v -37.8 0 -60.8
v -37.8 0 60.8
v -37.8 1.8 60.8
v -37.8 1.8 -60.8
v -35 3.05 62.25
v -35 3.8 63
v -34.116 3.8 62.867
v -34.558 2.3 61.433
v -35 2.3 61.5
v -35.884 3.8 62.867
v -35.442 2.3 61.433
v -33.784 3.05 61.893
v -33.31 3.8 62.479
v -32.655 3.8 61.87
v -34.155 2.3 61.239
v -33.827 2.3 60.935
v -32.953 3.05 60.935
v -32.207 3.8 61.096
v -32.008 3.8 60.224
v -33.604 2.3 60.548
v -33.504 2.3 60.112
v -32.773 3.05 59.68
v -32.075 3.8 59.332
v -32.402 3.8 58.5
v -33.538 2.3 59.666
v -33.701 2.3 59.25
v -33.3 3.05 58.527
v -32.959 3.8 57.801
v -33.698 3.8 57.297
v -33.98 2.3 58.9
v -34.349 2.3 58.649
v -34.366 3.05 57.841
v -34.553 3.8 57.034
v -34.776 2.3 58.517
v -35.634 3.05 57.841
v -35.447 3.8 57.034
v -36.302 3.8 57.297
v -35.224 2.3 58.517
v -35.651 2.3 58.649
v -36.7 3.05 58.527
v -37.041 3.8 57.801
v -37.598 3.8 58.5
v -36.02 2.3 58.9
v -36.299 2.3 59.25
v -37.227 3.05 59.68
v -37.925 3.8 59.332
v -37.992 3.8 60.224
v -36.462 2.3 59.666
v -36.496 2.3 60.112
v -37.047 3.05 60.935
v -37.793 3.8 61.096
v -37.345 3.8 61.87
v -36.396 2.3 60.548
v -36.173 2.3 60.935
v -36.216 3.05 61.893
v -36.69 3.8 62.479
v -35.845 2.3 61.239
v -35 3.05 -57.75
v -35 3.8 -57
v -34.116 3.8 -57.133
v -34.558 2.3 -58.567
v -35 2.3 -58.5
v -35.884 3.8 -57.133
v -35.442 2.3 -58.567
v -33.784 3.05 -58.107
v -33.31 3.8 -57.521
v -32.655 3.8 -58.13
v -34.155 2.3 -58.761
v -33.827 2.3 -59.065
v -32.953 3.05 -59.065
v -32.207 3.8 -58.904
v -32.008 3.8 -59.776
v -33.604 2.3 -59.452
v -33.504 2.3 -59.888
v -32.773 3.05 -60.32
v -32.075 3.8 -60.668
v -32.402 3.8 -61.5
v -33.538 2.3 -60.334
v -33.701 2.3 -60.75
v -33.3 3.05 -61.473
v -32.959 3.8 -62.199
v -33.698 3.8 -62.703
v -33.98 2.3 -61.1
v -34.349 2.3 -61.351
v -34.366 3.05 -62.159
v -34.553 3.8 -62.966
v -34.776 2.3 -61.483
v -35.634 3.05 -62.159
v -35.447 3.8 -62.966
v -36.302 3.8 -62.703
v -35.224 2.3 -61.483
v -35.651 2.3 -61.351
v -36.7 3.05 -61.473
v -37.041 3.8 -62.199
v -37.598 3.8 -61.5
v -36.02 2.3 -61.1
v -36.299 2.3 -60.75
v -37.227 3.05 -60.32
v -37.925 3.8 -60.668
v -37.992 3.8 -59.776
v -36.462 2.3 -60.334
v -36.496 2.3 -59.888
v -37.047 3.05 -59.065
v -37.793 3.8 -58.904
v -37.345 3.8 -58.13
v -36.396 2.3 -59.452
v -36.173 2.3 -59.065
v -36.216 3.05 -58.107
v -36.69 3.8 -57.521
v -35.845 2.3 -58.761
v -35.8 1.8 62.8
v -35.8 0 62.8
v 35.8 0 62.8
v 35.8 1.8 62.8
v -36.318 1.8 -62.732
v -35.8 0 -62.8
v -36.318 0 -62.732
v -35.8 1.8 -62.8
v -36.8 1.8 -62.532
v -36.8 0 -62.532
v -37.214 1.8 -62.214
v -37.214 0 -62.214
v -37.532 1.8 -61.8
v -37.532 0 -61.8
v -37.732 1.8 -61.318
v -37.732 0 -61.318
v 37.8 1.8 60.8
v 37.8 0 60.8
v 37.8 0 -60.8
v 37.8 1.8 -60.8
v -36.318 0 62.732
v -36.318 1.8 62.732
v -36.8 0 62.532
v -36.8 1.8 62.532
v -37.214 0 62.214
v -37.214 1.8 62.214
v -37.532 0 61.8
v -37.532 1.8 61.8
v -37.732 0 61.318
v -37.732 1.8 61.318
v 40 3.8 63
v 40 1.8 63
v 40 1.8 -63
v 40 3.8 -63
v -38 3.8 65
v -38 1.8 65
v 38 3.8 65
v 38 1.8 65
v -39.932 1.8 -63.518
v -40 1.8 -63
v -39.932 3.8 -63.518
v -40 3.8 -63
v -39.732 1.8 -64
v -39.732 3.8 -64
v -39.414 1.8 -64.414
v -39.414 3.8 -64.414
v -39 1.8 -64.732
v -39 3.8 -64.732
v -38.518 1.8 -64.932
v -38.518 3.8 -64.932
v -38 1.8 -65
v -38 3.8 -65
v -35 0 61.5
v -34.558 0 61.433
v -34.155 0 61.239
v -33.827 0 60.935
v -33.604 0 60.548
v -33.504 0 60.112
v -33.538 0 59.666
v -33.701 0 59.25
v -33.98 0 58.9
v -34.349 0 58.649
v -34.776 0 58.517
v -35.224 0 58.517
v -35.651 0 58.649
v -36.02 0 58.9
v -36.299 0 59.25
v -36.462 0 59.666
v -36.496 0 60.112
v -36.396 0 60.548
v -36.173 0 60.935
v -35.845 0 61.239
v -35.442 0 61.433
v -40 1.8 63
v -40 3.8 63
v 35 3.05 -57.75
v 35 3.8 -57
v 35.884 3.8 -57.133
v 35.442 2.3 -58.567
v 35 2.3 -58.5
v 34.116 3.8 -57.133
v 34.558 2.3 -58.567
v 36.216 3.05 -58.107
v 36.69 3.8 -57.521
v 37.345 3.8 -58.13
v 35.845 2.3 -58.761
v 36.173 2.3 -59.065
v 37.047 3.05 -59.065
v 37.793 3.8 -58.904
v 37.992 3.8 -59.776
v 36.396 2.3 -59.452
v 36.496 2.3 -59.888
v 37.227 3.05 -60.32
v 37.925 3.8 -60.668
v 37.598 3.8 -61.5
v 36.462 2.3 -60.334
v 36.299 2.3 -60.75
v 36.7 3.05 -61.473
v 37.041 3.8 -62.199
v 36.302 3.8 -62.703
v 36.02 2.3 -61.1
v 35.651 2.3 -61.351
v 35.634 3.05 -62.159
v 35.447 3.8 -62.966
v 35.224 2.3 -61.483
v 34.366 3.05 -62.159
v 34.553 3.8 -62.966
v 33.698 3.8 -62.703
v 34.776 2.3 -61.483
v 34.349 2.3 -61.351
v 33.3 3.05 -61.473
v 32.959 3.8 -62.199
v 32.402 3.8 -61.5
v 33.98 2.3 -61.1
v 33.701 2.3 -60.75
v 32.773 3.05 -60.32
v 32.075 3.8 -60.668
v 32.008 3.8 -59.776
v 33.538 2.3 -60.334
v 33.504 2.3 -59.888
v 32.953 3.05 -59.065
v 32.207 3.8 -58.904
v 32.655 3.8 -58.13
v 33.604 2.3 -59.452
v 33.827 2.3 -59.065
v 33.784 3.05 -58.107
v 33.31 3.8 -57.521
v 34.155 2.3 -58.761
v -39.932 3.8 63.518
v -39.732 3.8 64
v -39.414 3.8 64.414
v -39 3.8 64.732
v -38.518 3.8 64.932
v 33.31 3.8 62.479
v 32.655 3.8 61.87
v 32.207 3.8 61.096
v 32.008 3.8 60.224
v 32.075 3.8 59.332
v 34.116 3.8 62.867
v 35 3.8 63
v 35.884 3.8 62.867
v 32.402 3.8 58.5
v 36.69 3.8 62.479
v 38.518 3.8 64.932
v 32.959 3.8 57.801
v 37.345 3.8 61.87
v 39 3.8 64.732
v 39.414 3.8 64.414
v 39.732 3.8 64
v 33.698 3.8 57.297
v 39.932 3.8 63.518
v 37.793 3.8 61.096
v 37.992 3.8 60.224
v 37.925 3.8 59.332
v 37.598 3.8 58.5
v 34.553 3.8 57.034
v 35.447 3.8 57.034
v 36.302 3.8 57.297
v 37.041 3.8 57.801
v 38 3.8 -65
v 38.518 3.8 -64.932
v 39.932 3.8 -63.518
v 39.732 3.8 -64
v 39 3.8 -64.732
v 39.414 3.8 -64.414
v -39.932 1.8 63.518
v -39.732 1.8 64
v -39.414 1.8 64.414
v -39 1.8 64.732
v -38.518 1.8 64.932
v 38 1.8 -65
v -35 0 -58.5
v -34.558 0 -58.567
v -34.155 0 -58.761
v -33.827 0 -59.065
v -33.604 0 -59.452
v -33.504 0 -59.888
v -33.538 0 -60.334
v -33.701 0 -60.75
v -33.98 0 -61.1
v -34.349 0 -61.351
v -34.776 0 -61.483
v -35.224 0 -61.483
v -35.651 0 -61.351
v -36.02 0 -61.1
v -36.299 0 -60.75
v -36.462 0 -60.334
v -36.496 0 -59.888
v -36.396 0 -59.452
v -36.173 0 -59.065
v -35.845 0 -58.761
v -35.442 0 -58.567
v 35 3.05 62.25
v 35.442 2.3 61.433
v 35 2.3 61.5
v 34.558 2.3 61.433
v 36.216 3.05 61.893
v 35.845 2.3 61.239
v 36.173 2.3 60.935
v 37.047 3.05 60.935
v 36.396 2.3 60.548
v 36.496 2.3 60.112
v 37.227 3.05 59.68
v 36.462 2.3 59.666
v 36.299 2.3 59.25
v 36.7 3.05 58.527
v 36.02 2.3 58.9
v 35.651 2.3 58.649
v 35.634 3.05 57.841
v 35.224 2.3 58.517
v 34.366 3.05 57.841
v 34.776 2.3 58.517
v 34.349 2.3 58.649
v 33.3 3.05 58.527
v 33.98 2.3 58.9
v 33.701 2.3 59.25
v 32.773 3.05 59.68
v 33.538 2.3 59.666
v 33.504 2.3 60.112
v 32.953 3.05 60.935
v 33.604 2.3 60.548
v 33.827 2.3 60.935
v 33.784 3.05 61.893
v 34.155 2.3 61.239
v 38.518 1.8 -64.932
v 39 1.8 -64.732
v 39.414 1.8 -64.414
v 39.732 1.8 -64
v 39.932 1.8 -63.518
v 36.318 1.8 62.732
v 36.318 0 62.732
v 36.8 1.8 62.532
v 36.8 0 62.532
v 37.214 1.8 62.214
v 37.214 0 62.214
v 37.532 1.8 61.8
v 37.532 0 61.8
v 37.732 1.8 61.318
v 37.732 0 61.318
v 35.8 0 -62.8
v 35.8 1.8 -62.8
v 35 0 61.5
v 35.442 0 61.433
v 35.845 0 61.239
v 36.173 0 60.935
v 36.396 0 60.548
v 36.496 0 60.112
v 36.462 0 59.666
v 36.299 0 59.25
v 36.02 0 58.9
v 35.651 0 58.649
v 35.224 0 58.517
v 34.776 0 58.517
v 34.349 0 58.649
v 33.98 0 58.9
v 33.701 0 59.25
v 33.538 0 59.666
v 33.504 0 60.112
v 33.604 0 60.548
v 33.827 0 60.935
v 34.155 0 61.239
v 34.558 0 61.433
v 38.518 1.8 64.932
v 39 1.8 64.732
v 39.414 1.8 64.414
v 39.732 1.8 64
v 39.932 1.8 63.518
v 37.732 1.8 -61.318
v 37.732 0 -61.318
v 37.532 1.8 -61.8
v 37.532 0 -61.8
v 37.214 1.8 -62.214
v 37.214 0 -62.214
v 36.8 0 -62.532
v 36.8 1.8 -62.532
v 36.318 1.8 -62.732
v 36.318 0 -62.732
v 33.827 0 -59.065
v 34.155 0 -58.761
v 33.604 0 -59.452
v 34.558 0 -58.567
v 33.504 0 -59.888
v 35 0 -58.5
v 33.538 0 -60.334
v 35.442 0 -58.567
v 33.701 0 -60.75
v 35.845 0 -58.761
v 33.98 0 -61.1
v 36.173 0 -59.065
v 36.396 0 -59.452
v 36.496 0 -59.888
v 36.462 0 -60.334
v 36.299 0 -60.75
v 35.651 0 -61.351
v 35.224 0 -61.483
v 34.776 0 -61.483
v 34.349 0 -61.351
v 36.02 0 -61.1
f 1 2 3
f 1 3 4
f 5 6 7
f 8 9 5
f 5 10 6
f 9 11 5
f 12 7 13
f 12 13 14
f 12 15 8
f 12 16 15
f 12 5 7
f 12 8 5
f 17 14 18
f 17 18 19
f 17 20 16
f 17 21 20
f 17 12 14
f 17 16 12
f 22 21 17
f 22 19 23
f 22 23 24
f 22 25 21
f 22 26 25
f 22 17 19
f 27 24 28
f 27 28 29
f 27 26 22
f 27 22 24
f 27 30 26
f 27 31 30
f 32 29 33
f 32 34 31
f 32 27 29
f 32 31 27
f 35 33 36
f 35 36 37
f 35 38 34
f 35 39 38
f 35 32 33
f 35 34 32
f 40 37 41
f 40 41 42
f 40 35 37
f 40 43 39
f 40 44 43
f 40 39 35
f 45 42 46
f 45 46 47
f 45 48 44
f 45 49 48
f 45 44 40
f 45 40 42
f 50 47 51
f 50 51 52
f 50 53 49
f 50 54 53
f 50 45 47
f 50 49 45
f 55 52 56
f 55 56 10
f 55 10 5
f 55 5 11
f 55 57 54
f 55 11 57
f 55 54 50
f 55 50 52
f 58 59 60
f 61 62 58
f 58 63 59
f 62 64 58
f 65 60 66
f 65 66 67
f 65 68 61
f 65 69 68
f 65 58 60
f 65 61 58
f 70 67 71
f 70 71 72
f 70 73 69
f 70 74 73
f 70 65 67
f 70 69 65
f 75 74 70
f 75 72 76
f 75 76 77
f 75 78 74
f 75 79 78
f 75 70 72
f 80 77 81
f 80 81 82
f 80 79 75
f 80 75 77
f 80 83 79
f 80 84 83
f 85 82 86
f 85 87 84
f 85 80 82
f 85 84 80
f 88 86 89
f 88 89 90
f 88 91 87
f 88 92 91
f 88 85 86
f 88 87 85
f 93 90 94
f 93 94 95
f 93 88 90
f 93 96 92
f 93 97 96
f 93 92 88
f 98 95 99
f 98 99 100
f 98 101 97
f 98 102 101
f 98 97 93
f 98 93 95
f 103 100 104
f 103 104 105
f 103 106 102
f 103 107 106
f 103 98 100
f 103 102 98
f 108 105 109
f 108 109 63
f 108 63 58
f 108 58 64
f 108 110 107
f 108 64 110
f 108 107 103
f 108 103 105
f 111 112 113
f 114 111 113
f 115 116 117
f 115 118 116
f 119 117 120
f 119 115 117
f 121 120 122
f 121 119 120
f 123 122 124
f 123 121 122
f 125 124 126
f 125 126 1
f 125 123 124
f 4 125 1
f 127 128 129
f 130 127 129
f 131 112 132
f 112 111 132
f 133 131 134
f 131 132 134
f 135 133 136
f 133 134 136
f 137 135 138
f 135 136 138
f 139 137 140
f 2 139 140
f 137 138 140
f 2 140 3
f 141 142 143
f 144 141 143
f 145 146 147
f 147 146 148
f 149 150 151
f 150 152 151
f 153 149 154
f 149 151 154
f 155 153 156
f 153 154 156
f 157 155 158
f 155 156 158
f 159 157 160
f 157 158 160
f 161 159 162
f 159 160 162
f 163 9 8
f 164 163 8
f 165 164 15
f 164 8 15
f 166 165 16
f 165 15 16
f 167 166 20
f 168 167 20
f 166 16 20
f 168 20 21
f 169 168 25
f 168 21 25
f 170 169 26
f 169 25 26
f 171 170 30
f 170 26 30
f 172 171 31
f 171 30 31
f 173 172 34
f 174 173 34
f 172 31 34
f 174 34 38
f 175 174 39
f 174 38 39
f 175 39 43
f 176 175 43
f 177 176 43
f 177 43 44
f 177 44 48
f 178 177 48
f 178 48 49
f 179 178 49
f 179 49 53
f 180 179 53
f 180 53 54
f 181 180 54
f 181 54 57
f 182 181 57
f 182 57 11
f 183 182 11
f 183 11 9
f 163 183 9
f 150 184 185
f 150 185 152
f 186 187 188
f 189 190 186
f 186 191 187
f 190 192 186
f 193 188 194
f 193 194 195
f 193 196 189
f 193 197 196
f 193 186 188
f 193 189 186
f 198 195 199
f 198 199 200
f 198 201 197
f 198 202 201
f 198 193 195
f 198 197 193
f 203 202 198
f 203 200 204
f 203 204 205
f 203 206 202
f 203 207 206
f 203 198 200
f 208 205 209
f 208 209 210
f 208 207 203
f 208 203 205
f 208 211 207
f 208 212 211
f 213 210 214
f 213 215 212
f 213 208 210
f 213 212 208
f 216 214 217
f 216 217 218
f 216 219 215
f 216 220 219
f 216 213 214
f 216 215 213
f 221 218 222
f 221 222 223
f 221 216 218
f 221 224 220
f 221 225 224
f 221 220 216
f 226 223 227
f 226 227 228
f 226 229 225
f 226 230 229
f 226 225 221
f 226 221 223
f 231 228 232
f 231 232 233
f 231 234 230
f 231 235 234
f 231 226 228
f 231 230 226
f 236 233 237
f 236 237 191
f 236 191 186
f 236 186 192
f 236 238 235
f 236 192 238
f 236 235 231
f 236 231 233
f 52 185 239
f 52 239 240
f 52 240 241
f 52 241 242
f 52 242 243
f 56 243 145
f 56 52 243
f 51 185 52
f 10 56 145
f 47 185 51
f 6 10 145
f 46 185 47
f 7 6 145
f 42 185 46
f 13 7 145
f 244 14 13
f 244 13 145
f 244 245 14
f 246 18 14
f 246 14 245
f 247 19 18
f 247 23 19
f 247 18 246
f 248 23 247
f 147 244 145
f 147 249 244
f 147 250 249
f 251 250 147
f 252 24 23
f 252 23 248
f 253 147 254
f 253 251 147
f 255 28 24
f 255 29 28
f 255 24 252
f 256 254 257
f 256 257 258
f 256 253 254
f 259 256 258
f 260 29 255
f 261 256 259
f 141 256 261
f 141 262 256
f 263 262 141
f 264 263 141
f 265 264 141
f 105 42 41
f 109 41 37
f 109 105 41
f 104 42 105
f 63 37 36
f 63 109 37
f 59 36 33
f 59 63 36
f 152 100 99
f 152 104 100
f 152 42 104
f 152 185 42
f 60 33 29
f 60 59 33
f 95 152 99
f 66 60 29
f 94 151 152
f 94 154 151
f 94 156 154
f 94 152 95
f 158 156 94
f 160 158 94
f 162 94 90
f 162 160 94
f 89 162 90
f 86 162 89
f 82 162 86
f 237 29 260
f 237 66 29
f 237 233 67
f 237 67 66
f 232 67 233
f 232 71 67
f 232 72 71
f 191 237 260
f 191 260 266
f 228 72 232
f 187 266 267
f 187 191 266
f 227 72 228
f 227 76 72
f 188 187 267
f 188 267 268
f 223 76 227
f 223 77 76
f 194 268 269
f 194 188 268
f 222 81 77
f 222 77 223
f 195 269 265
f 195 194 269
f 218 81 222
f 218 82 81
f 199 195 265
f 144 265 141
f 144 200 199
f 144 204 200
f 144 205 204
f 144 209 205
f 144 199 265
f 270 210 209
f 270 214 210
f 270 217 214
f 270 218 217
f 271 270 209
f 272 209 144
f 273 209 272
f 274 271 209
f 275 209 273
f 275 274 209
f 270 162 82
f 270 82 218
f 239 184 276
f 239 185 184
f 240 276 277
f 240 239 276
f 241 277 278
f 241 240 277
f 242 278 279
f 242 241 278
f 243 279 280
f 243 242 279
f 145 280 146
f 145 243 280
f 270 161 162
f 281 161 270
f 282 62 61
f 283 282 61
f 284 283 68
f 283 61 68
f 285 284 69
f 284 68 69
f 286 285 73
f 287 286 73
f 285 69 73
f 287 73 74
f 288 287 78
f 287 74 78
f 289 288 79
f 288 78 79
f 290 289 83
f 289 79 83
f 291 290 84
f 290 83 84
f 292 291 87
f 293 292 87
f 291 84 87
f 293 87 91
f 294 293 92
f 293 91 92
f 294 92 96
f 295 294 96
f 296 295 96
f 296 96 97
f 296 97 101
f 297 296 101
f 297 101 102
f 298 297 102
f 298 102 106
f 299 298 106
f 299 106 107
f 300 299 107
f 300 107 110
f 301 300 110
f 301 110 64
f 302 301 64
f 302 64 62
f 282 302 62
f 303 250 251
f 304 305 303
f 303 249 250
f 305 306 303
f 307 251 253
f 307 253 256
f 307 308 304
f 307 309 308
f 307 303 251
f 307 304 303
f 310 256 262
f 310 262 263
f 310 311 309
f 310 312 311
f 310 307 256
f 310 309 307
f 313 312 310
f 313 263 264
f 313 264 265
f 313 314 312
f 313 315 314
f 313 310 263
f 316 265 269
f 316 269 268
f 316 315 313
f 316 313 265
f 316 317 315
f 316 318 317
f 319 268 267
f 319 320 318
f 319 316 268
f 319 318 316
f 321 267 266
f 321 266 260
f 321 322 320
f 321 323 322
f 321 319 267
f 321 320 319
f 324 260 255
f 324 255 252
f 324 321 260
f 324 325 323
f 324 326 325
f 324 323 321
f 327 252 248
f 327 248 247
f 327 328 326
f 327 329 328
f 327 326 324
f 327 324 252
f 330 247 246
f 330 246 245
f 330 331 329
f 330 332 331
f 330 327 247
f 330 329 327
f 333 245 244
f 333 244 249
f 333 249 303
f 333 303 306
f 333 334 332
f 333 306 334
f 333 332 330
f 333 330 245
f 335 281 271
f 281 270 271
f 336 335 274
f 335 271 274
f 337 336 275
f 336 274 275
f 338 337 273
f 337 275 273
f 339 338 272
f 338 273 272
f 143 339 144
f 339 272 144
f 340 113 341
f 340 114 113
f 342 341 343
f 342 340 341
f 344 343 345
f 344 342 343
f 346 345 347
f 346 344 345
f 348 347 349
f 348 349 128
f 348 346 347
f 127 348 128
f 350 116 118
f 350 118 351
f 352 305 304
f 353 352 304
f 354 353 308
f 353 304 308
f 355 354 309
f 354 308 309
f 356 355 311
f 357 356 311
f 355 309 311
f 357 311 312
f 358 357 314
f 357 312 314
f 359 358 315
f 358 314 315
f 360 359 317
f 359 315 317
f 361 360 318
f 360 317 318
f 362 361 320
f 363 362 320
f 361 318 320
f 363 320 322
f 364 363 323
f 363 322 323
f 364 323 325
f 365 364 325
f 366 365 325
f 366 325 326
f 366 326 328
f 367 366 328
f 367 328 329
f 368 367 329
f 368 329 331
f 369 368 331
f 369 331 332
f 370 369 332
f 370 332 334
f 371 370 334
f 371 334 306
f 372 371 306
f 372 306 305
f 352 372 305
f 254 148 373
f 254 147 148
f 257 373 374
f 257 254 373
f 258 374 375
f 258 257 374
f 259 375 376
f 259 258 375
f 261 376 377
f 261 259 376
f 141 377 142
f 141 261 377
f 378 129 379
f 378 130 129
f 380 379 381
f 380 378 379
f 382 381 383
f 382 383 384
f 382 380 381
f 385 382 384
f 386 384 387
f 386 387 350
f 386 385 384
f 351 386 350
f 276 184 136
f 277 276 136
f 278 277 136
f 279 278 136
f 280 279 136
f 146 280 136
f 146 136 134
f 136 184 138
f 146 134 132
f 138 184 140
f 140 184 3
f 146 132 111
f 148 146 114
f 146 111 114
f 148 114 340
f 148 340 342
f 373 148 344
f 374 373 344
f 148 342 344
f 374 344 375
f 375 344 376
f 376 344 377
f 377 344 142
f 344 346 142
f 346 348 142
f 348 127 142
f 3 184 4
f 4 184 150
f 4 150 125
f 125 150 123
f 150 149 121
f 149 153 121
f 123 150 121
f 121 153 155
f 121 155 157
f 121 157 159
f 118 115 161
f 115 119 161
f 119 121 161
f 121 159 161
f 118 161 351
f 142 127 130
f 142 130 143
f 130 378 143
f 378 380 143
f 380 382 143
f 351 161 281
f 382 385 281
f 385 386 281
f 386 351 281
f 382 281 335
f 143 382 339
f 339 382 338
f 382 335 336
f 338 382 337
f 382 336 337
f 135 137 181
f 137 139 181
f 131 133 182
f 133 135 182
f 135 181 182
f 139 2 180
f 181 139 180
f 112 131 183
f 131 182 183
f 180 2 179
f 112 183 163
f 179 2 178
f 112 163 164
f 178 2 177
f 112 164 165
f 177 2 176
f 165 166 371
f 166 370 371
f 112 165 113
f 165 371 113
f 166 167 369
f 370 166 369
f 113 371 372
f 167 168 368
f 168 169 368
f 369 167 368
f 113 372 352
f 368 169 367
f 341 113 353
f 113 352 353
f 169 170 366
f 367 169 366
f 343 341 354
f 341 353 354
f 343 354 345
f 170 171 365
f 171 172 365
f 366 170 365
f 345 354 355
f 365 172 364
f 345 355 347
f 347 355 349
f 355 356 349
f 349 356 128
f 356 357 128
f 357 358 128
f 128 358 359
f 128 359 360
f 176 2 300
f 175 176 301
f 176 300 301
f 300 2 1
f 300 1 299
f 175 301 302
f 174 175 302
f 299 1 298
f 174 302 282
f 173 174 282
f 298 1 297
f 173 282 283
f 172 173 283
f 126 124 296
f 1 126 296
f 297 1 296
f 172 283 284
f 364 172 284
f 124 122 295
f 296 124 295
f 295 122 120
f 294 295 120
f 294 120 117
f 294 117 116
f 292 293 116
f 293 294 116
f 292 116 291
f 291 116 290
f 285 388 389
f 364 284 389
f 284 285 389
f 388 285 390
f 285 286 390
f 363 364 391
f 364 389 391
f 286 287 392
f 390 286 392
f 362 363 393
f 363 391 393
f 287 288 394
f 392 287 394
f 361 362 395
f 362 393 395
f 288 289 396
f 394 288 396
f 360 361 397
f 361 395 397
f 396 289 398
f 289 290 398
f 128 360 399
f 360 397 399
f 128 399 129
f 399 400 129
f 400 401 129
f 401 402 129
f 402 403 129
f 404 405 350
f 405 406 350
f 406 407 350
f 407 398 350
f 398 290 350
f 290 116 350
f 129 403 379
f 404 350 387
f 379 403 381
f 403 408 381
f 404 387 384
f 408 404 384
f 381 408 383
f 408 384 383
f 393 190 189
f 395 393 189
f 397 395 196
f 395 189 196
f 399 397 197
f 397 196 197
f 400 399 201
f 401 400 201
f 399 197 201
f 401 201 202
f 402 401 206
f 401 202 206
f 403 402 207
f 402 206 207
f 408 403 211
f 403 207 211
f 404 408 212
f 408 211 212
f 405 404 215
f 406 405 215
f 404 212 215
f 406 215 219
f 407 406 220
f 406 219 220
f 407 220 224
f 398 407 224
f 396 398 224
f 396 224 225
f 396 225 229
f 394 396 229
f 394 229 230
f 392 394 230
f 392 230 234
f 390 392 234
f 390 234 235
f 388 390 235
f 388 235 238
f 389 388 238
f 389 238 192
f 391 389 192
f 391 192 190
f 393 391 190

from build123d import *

# Parameters (mm, degrees)
SKETCH1_W           = 75.6
SKETCH1_H           = 125.6
BOSS_EXTRUDE1_DEPTH = 1.8
SKETCH2_W           = 80
SKETCH2_H           = 130
BOSS_EXTRUDE2_DEPTH = 2
SKETCH3_R           = 1.5
CUT_EXTRUDE1_DEPTH  = 77.416228643
CHAMFER1_SIZE       = 1.5
FILLET1_R           = 2


with BuildPart() as part:
    # Sketch1 → Boss-Extrude1 (new body)
    with BuildSketch(Plane(origin=(0, 0, 0), x_dir=(1, 0, 0), z_dir=(0, 1, 0))):
        Rectangle(SKETCH1_W, SKETCH1_H)
    extrude(amount=BOSS_EXTRUDE1_DEPTH)

    # Sketch2 → Boss-Extrude2 (add)
    with BuildSketch(Plane(origin=(0, 1.8, 0), x_dir=(1, 0, 0), z_dir=(0, 1, 0))):
        Rectangle(SKETCH2_W, SKETCH2_H)
    extrude(amount=BOSS_EXTRUDE2_DEPTH)

    # Sketch3 → Cut-Extrude1 (cut, through all)
    with BuildSketch(Plane(origin=(0, 3.8, 0), x_dir=(1, 0, 0), z_dir=(0, 1, 0))):
        with Locations(Location((-35, 60, 0), (0, 0, 270))):
            Circle(SKETCH3_R)
        with Locations(Location((35, 60, 0), (0, 0, 270))):
            Circle(SKETCH3_R)
        with Locations(Location((35, -60, 0), (0, 0, 270))):
            Circle(SKETCH3_R)
        with Locations(Location((-35, -60, 0), (0, 0, 270))):
            Circle(SKETCH3_R)
    extrude(amount=-CUT_EXTRUDE1_DEPTH, mode=Mode.SUBTRACT)

    # Chamfer1
    chamfer1_edges = [part.edges().sort_by_distance(p)[0] for p in [
        (-35, 3.8, 58.5),
        (35, 3.8, 58.5),
        (35, 3.8, -61.5),
        (-35, 3.8, -61.5),
    ]]
    chamfer(chamfer1_edges, length=CHAMFER1_SIZE)

    # Fillet1
    fillet1_edges = [part.edges().sort_by_distance(p)[0] for p in [
        (40, 2.8, 65),
        (40, 2.8, -65),
        (-40, 2.8, -65),
        (-40, 2.8, 65),
        (37.8, 0.9, 62.8),
        (-37.8, 0.9, 62.8),
        (-37.8, 0.9, -62.8),
        (37.8, 0.9, -62.8),
    ]]
    fillet(fillet1_edges, radius=FILLET1_R)


solid = part.part
